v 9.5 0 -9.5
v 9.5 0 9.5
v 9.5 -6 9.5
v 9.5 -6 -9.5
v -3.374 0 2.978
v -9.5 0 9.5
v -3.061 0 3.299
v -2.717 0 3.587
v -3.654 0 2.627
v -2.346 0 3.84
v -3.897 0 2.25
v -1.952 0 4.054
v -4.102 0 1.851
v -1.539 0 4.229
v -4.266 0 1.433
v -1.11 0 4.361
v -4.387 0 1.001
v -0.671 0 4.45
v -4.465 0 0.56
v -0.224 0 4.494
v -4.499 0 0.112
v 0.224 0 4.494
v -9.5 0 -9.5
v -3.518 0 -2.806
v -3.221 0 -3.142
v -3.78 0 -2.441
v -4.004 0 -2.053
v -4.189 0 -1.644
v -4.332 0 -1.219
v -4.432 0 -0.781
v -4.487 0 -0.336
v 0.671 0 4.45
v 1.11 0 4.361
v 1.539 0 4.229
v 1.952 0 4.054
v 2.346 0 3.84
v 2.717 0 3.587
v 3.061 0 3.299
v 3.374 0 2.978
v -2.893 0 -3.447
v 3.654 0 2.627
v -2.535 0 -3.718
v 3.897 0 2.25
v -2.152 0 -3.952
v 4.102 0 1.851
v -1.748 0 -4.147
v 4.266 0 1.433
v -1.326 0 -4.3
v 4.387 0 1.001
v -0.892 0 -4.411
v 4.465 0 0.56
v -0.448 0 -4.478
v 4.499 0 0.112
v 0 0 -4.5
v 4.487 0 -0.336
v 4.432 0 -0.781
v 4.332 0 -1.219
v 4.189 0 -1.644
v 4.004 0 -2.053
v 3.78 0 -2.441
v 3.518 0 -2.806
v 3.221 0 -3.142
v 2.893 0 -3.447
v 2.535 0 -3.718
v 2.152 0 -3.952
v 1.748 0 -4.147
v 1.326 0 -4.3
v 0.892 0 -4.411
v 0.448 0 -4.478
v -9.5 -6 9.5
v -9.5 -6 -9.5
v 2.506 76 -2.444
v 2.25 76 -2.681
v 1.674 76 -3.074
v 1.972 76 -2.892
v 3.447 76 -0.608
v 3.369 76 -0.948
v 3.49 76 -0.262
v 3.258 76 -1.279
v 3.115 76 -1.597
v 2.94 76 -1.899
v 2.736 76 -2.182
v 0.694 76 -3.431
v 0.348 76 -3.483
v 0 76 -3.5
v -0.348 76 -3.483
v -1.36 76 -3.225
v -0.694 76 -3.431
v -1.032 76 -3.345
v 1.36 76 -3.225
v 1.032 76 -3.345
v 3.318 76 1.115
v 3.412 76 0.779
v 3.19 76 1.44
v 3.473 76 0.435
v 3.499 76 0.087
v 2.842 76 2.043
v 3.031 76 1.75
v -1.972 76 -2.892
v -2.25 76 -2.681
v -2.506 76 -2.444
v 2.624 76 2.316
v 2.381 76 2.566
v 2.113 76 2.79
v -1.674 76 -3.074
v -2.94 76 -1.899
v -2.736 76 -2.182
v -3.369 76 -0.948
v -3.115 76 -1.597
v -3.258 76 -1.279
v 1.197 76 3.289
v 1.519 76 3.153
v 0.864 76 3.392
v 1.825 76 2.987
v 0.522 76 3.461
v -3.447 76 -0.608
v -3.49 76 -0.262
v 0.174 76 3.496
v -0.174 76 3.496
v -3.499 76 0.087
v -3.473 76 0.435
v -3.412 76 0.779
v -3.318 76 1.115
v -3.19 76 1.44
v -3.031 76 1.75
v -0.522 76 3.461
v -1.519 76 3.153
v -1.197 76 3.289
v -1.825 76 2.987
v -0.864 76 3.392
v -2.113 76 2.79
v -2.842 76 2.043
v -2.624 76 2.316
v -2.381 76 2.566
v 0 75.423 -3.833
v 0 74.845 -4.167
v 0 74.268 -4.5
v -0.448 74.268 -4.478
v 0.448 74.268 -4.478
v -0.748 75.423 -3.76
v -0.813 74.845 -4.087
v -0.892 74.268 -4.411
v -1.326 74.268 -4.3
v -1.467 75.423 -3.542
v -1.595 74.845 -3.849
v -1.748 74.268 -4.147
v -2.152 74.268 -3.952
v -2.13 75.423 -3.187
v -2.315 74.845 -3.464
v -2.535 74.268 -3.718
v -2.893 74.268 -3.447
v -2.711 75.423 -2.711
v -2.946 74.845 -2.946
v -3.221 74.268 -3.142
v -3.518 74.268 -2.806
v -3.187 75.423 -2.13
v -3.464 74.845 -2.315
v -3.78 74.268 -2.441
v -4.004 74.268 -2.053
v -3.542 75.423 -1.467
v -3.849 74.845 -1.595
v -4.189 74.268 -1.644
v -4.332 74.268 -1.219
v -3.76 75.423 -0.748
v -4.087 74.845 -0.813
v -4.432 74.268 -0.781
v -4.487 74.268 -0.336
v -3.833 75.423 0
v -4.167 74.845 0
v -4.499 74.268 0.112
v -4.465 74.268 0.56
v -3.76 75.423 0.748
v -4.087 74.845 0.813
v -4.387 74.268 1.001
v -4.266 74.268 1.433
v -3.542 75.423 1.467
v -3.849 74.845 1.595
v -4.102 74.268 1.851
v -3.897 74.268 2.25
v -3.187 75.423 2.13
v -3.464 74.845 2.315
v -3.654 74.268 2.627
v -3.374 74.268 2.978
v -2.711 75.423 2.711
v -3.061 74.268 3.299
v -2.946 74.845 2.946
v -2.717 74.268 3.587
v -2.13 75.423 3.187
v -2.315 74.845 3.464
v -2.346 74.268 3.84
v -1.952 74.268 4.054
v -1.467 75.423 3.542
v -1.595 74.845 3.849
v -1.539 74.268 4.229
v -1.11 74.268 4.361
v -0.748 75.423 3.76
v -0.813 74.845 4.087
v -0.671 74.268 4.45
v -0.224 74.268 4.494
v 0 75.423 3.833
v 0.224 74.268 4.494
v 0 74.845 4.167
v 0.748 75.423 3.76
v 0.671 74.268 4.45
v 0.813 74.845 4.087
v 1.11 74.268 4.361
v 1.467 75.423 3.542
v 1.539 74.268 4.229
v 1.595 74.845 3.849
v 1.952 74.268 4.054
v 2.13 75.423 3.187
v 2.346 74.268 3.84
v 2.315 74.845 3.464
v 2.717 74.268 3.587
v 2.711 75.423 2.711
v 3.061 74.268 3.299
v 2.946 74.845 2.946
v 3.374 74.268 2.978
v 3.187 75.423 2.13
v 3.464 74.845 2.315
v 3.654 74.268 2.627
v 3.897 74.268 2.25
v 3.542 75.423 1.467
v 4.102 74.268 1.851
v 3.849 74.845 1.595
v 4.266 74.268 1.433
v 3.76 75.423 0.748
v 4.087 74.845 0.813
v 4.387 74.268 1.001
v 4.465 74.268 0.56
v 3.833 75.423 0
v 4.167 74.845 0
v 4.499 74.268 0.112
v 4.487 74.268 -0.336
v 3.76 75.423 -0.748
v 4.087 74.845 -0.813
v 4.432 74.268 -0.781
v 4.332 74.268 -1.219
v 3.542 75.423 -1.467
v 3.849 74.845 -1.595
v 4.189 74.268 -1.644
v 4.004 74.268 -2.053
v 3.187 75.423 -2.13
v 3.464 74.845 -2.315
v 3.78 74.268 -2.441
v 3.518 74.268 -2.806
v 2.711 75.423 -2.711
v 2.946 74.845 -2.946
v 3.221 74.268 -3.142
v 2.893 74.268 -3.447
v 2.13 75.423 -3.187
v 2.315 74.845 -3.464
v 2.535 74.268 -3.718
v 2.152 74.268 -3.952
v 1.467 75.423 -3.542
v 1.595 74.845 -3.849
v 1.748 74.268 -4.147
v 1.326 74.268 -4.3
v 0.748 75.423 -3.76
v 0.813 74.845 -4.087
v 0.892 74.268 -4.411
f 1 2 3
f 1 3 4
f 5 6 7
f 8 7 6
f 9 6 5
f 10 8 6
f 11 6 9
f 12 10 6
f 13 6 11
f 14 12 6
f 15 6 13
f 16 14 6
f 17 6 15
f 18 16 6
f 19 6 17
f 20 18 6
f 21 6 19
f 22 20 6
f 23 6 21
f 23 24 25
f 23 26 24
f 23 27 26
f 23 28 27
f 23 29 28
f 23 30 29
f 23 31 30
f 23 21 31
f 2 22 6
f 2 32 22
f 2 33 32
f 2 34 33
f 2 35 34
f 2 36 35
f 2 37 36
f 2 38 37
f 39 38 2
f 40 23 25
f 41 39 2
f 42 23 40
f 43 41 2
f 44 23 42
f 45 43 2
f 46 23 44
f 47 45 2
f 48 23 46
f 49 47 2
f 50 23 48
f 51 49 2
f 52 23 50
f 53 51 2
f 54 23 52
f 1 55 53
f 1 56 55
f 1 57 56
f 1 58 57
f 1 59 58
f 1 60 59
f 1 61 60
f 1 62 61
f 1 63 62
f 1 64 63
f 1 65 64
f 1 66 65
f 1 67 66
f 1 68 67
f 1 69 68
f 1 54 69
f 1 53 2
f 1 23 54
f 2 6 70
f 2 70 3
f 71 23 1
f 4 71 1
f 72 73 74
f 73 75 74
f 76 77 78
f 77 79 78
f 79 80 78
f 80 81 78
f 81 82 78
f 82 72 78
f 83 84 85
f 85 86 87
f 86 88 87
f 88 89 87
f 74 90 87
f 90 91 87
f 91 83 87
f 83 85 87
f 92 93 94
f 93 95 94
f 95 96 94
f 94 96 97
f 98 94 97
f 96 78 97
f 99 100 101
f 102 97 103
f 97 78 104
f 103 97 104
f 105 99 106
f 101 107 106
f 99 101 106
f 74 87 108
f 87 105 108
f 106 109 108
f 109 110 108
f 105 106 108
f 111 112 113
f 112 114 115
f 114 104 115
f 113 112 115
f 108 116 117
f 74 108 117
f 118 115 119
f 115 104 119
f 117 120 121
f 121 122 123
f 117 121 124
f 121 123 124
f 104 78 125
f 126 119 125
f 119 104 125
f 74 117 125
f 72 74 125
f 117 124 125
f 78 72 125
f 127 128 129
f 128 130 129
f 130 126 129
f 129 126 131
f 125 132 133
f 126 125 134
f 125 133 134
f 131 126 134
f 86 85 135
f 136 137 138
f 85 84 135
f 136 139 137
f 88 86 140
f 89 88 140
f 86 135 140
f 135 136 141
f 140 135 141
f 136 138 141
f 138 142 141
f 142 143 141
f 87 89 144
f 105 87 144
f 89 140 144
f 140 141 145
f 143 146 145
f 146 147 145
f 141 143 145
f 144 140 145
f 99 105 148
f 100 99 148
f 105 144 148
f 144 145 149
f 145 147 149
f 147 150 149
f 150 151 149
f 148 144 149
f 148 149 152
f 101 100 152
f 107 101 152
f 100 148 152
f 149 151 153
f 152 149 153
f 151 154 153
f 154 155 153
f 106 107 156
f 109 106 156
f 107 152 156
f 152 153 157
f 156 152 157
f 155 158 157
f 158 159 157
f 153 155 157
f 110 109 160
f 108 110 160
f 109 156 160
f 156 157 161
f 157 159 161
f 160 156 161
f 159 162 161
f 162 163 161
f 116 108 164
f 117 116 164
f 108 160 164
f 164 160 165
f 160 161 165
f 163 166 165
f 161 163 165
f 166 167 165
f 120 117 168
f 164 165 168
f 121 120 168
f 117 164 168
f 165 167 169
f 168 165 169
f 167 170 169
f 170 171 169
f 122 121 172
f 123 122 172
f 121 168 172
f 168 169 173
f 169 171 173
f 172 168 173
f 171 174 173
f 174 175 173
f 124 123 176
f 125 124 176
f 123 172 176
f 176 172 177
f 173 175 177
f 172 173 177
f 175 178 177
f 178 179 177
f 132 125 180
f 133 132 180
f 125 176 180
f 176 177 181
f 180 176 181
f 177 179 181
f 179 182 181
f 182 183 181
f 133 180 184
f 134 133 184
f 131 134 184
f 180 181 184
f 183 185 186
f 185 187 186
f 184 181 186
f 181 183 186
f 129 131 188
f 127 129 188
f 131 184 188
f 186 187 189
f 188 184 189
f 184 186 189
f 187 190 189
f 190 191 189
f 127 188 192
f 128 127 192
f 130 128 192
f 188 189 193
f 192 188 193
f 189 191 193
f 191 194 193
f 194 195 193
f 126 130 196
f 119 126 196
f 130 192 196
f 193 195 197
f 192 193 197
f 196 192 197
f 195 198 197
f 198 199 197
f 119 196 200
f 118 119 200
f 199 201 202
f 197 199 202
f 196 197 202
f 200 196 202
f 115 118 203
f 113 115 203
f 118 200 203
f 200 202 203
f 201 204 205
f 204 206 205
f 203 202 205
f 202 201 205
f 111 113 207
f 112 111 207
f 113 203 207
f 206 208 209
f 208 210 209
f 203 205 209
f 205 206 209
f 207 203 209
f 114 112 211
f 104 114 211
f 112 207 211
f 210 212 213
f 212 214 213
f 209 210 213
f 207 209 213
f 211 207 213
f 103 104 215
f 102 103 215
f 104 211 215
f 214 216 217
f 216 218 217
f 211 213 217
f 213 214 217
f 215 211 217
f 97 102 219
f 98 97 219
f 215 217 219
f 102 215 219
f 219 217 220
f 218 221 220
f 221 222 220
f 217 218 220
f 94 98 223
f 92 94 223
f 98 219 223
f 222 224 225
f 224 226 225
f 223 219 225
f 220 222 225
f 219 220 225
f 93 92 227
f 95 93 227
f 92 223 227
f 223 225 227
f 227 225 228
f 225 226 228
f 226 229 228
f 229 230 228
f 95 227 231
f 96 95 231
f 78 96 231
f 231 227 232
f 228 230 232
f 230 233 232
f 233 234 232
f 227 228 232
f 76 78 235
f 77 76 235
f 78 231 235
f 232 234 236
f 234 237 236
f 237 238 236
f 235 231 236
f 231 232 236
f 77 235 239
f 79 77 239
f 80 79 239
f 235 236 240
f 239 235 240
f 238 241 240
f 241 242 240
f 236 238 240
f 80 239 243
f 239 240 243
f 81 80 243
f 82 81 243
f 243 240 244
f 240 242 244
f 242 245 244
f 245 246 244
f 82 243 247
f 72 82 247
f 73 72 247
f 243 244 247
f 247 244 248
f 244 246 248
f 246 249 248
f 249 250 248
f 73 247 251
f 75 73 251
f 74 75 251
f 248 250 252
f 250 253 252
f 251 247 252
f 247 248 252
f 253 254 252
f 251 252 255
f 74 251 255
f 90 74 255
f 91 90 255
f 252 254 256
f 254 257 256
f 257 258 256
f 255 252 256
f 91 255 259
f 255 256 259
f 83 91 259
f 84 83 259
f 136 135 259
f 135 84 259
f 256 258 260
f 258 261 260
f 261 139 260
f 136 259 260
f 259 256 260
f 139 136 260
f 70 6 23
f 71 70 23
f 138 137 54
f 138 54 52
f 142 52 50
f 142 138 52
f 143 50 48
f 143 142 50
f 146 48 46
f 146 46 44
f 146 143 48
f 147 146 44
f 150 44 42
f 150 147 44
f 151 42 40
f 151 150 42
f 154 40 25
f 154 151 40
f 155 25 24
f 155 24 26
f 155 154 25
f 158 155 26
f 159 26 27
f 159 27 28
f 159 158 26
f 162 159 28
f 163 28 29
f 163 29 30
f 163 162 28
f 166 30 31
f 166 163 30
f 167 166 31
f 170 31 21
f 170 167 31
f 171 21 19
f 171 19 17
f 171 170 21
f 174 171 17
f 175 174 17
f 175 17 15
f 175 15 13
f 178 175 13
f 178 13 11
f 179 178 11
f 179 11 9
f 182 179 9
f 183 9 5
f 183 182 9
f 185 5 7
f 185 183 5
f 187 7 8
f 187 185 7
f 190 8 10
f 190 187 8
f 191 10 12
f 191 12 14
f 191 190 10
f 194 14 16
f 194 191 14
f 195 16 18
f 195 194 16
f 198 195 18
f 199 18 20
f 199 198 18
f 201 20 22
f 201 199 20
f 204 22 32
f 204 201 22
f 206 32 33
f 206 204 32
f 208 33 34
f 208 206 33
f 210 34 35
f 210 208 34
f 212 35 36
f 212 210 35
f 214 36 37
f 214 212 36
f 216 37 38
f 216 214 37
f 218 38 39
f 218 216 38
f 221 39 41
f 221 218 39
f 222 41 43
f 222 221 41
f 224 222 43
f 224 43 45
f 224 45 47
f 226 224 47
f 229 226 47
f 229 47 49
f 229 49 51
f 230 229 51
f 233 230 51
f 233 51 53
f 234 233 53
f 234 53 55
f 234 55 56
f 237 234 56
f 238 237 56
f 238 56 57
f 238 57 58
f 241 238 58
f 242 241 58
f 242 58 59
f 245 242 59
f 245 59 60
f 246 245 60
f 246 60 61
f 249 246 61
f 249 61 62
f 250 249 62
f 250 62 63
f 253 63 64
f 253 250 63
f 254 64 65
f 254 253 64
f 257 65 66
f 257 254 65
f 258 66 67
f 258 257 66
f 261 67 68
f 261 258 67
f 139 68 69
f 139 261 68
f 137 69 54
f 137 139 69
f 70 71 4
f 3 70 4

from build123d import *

# Parameters (mm, degrees)
SKETCH1_W           = 4.5
SKETCH1_H           = 76
SKETCH2_W           = 19
SKETCH2_H           = 19
BOSS_EXTRUDE1_DEPTH = 6
CHAMFER2_SIZE       = 1
CHAMFER2_SIZE2      = 1.732050808


with BuildPart() as part:
    # Sketch1 → Revolve1 (revolve)
    with BuildSketch(Plane.XY, mode=Mode.PRIVATE) as revolve1_sk:
        with Locations((2.25, 38)):
            Rectangle(SKETCH1_W, SKETCH1_H)
    revolve(revolve1_sk.sketch.rotate(Axis((0, 0, 0), (0, 1, 0)), 90), axis=Axis((0, 0, 0), (0, 1, 0)))  # turned: the seam where the file's is

    # Sketch2 → Boss-Extrude1 (add)
    with BuildSketch(Plane(origin=(0, 0, 0), x_dir=(1, 0, 0), z_dir=(0, 1, 0))):
        Rectangle(SKETCH2_W, SKETCH2_H)
    extrude(amount=-BOSS_EXTRUDE1_DEPTH)

    # Chamfer2
    chamfer2_edges = [part.edges().sort_by_distance(p)[0] for p in [
        (0, 76, 4.5),
    ]]
    chamfer2_side = [part.faces().sort_by_distance(p)[0] for p in [
        (0, 76, 0),
    ]]
    chamfer(chamfer2_edges, length=CHAMFER2_SIZE, length2=CHAMFER2_SIZE2, reference=chamfer2_side[0])


solid = part.part
